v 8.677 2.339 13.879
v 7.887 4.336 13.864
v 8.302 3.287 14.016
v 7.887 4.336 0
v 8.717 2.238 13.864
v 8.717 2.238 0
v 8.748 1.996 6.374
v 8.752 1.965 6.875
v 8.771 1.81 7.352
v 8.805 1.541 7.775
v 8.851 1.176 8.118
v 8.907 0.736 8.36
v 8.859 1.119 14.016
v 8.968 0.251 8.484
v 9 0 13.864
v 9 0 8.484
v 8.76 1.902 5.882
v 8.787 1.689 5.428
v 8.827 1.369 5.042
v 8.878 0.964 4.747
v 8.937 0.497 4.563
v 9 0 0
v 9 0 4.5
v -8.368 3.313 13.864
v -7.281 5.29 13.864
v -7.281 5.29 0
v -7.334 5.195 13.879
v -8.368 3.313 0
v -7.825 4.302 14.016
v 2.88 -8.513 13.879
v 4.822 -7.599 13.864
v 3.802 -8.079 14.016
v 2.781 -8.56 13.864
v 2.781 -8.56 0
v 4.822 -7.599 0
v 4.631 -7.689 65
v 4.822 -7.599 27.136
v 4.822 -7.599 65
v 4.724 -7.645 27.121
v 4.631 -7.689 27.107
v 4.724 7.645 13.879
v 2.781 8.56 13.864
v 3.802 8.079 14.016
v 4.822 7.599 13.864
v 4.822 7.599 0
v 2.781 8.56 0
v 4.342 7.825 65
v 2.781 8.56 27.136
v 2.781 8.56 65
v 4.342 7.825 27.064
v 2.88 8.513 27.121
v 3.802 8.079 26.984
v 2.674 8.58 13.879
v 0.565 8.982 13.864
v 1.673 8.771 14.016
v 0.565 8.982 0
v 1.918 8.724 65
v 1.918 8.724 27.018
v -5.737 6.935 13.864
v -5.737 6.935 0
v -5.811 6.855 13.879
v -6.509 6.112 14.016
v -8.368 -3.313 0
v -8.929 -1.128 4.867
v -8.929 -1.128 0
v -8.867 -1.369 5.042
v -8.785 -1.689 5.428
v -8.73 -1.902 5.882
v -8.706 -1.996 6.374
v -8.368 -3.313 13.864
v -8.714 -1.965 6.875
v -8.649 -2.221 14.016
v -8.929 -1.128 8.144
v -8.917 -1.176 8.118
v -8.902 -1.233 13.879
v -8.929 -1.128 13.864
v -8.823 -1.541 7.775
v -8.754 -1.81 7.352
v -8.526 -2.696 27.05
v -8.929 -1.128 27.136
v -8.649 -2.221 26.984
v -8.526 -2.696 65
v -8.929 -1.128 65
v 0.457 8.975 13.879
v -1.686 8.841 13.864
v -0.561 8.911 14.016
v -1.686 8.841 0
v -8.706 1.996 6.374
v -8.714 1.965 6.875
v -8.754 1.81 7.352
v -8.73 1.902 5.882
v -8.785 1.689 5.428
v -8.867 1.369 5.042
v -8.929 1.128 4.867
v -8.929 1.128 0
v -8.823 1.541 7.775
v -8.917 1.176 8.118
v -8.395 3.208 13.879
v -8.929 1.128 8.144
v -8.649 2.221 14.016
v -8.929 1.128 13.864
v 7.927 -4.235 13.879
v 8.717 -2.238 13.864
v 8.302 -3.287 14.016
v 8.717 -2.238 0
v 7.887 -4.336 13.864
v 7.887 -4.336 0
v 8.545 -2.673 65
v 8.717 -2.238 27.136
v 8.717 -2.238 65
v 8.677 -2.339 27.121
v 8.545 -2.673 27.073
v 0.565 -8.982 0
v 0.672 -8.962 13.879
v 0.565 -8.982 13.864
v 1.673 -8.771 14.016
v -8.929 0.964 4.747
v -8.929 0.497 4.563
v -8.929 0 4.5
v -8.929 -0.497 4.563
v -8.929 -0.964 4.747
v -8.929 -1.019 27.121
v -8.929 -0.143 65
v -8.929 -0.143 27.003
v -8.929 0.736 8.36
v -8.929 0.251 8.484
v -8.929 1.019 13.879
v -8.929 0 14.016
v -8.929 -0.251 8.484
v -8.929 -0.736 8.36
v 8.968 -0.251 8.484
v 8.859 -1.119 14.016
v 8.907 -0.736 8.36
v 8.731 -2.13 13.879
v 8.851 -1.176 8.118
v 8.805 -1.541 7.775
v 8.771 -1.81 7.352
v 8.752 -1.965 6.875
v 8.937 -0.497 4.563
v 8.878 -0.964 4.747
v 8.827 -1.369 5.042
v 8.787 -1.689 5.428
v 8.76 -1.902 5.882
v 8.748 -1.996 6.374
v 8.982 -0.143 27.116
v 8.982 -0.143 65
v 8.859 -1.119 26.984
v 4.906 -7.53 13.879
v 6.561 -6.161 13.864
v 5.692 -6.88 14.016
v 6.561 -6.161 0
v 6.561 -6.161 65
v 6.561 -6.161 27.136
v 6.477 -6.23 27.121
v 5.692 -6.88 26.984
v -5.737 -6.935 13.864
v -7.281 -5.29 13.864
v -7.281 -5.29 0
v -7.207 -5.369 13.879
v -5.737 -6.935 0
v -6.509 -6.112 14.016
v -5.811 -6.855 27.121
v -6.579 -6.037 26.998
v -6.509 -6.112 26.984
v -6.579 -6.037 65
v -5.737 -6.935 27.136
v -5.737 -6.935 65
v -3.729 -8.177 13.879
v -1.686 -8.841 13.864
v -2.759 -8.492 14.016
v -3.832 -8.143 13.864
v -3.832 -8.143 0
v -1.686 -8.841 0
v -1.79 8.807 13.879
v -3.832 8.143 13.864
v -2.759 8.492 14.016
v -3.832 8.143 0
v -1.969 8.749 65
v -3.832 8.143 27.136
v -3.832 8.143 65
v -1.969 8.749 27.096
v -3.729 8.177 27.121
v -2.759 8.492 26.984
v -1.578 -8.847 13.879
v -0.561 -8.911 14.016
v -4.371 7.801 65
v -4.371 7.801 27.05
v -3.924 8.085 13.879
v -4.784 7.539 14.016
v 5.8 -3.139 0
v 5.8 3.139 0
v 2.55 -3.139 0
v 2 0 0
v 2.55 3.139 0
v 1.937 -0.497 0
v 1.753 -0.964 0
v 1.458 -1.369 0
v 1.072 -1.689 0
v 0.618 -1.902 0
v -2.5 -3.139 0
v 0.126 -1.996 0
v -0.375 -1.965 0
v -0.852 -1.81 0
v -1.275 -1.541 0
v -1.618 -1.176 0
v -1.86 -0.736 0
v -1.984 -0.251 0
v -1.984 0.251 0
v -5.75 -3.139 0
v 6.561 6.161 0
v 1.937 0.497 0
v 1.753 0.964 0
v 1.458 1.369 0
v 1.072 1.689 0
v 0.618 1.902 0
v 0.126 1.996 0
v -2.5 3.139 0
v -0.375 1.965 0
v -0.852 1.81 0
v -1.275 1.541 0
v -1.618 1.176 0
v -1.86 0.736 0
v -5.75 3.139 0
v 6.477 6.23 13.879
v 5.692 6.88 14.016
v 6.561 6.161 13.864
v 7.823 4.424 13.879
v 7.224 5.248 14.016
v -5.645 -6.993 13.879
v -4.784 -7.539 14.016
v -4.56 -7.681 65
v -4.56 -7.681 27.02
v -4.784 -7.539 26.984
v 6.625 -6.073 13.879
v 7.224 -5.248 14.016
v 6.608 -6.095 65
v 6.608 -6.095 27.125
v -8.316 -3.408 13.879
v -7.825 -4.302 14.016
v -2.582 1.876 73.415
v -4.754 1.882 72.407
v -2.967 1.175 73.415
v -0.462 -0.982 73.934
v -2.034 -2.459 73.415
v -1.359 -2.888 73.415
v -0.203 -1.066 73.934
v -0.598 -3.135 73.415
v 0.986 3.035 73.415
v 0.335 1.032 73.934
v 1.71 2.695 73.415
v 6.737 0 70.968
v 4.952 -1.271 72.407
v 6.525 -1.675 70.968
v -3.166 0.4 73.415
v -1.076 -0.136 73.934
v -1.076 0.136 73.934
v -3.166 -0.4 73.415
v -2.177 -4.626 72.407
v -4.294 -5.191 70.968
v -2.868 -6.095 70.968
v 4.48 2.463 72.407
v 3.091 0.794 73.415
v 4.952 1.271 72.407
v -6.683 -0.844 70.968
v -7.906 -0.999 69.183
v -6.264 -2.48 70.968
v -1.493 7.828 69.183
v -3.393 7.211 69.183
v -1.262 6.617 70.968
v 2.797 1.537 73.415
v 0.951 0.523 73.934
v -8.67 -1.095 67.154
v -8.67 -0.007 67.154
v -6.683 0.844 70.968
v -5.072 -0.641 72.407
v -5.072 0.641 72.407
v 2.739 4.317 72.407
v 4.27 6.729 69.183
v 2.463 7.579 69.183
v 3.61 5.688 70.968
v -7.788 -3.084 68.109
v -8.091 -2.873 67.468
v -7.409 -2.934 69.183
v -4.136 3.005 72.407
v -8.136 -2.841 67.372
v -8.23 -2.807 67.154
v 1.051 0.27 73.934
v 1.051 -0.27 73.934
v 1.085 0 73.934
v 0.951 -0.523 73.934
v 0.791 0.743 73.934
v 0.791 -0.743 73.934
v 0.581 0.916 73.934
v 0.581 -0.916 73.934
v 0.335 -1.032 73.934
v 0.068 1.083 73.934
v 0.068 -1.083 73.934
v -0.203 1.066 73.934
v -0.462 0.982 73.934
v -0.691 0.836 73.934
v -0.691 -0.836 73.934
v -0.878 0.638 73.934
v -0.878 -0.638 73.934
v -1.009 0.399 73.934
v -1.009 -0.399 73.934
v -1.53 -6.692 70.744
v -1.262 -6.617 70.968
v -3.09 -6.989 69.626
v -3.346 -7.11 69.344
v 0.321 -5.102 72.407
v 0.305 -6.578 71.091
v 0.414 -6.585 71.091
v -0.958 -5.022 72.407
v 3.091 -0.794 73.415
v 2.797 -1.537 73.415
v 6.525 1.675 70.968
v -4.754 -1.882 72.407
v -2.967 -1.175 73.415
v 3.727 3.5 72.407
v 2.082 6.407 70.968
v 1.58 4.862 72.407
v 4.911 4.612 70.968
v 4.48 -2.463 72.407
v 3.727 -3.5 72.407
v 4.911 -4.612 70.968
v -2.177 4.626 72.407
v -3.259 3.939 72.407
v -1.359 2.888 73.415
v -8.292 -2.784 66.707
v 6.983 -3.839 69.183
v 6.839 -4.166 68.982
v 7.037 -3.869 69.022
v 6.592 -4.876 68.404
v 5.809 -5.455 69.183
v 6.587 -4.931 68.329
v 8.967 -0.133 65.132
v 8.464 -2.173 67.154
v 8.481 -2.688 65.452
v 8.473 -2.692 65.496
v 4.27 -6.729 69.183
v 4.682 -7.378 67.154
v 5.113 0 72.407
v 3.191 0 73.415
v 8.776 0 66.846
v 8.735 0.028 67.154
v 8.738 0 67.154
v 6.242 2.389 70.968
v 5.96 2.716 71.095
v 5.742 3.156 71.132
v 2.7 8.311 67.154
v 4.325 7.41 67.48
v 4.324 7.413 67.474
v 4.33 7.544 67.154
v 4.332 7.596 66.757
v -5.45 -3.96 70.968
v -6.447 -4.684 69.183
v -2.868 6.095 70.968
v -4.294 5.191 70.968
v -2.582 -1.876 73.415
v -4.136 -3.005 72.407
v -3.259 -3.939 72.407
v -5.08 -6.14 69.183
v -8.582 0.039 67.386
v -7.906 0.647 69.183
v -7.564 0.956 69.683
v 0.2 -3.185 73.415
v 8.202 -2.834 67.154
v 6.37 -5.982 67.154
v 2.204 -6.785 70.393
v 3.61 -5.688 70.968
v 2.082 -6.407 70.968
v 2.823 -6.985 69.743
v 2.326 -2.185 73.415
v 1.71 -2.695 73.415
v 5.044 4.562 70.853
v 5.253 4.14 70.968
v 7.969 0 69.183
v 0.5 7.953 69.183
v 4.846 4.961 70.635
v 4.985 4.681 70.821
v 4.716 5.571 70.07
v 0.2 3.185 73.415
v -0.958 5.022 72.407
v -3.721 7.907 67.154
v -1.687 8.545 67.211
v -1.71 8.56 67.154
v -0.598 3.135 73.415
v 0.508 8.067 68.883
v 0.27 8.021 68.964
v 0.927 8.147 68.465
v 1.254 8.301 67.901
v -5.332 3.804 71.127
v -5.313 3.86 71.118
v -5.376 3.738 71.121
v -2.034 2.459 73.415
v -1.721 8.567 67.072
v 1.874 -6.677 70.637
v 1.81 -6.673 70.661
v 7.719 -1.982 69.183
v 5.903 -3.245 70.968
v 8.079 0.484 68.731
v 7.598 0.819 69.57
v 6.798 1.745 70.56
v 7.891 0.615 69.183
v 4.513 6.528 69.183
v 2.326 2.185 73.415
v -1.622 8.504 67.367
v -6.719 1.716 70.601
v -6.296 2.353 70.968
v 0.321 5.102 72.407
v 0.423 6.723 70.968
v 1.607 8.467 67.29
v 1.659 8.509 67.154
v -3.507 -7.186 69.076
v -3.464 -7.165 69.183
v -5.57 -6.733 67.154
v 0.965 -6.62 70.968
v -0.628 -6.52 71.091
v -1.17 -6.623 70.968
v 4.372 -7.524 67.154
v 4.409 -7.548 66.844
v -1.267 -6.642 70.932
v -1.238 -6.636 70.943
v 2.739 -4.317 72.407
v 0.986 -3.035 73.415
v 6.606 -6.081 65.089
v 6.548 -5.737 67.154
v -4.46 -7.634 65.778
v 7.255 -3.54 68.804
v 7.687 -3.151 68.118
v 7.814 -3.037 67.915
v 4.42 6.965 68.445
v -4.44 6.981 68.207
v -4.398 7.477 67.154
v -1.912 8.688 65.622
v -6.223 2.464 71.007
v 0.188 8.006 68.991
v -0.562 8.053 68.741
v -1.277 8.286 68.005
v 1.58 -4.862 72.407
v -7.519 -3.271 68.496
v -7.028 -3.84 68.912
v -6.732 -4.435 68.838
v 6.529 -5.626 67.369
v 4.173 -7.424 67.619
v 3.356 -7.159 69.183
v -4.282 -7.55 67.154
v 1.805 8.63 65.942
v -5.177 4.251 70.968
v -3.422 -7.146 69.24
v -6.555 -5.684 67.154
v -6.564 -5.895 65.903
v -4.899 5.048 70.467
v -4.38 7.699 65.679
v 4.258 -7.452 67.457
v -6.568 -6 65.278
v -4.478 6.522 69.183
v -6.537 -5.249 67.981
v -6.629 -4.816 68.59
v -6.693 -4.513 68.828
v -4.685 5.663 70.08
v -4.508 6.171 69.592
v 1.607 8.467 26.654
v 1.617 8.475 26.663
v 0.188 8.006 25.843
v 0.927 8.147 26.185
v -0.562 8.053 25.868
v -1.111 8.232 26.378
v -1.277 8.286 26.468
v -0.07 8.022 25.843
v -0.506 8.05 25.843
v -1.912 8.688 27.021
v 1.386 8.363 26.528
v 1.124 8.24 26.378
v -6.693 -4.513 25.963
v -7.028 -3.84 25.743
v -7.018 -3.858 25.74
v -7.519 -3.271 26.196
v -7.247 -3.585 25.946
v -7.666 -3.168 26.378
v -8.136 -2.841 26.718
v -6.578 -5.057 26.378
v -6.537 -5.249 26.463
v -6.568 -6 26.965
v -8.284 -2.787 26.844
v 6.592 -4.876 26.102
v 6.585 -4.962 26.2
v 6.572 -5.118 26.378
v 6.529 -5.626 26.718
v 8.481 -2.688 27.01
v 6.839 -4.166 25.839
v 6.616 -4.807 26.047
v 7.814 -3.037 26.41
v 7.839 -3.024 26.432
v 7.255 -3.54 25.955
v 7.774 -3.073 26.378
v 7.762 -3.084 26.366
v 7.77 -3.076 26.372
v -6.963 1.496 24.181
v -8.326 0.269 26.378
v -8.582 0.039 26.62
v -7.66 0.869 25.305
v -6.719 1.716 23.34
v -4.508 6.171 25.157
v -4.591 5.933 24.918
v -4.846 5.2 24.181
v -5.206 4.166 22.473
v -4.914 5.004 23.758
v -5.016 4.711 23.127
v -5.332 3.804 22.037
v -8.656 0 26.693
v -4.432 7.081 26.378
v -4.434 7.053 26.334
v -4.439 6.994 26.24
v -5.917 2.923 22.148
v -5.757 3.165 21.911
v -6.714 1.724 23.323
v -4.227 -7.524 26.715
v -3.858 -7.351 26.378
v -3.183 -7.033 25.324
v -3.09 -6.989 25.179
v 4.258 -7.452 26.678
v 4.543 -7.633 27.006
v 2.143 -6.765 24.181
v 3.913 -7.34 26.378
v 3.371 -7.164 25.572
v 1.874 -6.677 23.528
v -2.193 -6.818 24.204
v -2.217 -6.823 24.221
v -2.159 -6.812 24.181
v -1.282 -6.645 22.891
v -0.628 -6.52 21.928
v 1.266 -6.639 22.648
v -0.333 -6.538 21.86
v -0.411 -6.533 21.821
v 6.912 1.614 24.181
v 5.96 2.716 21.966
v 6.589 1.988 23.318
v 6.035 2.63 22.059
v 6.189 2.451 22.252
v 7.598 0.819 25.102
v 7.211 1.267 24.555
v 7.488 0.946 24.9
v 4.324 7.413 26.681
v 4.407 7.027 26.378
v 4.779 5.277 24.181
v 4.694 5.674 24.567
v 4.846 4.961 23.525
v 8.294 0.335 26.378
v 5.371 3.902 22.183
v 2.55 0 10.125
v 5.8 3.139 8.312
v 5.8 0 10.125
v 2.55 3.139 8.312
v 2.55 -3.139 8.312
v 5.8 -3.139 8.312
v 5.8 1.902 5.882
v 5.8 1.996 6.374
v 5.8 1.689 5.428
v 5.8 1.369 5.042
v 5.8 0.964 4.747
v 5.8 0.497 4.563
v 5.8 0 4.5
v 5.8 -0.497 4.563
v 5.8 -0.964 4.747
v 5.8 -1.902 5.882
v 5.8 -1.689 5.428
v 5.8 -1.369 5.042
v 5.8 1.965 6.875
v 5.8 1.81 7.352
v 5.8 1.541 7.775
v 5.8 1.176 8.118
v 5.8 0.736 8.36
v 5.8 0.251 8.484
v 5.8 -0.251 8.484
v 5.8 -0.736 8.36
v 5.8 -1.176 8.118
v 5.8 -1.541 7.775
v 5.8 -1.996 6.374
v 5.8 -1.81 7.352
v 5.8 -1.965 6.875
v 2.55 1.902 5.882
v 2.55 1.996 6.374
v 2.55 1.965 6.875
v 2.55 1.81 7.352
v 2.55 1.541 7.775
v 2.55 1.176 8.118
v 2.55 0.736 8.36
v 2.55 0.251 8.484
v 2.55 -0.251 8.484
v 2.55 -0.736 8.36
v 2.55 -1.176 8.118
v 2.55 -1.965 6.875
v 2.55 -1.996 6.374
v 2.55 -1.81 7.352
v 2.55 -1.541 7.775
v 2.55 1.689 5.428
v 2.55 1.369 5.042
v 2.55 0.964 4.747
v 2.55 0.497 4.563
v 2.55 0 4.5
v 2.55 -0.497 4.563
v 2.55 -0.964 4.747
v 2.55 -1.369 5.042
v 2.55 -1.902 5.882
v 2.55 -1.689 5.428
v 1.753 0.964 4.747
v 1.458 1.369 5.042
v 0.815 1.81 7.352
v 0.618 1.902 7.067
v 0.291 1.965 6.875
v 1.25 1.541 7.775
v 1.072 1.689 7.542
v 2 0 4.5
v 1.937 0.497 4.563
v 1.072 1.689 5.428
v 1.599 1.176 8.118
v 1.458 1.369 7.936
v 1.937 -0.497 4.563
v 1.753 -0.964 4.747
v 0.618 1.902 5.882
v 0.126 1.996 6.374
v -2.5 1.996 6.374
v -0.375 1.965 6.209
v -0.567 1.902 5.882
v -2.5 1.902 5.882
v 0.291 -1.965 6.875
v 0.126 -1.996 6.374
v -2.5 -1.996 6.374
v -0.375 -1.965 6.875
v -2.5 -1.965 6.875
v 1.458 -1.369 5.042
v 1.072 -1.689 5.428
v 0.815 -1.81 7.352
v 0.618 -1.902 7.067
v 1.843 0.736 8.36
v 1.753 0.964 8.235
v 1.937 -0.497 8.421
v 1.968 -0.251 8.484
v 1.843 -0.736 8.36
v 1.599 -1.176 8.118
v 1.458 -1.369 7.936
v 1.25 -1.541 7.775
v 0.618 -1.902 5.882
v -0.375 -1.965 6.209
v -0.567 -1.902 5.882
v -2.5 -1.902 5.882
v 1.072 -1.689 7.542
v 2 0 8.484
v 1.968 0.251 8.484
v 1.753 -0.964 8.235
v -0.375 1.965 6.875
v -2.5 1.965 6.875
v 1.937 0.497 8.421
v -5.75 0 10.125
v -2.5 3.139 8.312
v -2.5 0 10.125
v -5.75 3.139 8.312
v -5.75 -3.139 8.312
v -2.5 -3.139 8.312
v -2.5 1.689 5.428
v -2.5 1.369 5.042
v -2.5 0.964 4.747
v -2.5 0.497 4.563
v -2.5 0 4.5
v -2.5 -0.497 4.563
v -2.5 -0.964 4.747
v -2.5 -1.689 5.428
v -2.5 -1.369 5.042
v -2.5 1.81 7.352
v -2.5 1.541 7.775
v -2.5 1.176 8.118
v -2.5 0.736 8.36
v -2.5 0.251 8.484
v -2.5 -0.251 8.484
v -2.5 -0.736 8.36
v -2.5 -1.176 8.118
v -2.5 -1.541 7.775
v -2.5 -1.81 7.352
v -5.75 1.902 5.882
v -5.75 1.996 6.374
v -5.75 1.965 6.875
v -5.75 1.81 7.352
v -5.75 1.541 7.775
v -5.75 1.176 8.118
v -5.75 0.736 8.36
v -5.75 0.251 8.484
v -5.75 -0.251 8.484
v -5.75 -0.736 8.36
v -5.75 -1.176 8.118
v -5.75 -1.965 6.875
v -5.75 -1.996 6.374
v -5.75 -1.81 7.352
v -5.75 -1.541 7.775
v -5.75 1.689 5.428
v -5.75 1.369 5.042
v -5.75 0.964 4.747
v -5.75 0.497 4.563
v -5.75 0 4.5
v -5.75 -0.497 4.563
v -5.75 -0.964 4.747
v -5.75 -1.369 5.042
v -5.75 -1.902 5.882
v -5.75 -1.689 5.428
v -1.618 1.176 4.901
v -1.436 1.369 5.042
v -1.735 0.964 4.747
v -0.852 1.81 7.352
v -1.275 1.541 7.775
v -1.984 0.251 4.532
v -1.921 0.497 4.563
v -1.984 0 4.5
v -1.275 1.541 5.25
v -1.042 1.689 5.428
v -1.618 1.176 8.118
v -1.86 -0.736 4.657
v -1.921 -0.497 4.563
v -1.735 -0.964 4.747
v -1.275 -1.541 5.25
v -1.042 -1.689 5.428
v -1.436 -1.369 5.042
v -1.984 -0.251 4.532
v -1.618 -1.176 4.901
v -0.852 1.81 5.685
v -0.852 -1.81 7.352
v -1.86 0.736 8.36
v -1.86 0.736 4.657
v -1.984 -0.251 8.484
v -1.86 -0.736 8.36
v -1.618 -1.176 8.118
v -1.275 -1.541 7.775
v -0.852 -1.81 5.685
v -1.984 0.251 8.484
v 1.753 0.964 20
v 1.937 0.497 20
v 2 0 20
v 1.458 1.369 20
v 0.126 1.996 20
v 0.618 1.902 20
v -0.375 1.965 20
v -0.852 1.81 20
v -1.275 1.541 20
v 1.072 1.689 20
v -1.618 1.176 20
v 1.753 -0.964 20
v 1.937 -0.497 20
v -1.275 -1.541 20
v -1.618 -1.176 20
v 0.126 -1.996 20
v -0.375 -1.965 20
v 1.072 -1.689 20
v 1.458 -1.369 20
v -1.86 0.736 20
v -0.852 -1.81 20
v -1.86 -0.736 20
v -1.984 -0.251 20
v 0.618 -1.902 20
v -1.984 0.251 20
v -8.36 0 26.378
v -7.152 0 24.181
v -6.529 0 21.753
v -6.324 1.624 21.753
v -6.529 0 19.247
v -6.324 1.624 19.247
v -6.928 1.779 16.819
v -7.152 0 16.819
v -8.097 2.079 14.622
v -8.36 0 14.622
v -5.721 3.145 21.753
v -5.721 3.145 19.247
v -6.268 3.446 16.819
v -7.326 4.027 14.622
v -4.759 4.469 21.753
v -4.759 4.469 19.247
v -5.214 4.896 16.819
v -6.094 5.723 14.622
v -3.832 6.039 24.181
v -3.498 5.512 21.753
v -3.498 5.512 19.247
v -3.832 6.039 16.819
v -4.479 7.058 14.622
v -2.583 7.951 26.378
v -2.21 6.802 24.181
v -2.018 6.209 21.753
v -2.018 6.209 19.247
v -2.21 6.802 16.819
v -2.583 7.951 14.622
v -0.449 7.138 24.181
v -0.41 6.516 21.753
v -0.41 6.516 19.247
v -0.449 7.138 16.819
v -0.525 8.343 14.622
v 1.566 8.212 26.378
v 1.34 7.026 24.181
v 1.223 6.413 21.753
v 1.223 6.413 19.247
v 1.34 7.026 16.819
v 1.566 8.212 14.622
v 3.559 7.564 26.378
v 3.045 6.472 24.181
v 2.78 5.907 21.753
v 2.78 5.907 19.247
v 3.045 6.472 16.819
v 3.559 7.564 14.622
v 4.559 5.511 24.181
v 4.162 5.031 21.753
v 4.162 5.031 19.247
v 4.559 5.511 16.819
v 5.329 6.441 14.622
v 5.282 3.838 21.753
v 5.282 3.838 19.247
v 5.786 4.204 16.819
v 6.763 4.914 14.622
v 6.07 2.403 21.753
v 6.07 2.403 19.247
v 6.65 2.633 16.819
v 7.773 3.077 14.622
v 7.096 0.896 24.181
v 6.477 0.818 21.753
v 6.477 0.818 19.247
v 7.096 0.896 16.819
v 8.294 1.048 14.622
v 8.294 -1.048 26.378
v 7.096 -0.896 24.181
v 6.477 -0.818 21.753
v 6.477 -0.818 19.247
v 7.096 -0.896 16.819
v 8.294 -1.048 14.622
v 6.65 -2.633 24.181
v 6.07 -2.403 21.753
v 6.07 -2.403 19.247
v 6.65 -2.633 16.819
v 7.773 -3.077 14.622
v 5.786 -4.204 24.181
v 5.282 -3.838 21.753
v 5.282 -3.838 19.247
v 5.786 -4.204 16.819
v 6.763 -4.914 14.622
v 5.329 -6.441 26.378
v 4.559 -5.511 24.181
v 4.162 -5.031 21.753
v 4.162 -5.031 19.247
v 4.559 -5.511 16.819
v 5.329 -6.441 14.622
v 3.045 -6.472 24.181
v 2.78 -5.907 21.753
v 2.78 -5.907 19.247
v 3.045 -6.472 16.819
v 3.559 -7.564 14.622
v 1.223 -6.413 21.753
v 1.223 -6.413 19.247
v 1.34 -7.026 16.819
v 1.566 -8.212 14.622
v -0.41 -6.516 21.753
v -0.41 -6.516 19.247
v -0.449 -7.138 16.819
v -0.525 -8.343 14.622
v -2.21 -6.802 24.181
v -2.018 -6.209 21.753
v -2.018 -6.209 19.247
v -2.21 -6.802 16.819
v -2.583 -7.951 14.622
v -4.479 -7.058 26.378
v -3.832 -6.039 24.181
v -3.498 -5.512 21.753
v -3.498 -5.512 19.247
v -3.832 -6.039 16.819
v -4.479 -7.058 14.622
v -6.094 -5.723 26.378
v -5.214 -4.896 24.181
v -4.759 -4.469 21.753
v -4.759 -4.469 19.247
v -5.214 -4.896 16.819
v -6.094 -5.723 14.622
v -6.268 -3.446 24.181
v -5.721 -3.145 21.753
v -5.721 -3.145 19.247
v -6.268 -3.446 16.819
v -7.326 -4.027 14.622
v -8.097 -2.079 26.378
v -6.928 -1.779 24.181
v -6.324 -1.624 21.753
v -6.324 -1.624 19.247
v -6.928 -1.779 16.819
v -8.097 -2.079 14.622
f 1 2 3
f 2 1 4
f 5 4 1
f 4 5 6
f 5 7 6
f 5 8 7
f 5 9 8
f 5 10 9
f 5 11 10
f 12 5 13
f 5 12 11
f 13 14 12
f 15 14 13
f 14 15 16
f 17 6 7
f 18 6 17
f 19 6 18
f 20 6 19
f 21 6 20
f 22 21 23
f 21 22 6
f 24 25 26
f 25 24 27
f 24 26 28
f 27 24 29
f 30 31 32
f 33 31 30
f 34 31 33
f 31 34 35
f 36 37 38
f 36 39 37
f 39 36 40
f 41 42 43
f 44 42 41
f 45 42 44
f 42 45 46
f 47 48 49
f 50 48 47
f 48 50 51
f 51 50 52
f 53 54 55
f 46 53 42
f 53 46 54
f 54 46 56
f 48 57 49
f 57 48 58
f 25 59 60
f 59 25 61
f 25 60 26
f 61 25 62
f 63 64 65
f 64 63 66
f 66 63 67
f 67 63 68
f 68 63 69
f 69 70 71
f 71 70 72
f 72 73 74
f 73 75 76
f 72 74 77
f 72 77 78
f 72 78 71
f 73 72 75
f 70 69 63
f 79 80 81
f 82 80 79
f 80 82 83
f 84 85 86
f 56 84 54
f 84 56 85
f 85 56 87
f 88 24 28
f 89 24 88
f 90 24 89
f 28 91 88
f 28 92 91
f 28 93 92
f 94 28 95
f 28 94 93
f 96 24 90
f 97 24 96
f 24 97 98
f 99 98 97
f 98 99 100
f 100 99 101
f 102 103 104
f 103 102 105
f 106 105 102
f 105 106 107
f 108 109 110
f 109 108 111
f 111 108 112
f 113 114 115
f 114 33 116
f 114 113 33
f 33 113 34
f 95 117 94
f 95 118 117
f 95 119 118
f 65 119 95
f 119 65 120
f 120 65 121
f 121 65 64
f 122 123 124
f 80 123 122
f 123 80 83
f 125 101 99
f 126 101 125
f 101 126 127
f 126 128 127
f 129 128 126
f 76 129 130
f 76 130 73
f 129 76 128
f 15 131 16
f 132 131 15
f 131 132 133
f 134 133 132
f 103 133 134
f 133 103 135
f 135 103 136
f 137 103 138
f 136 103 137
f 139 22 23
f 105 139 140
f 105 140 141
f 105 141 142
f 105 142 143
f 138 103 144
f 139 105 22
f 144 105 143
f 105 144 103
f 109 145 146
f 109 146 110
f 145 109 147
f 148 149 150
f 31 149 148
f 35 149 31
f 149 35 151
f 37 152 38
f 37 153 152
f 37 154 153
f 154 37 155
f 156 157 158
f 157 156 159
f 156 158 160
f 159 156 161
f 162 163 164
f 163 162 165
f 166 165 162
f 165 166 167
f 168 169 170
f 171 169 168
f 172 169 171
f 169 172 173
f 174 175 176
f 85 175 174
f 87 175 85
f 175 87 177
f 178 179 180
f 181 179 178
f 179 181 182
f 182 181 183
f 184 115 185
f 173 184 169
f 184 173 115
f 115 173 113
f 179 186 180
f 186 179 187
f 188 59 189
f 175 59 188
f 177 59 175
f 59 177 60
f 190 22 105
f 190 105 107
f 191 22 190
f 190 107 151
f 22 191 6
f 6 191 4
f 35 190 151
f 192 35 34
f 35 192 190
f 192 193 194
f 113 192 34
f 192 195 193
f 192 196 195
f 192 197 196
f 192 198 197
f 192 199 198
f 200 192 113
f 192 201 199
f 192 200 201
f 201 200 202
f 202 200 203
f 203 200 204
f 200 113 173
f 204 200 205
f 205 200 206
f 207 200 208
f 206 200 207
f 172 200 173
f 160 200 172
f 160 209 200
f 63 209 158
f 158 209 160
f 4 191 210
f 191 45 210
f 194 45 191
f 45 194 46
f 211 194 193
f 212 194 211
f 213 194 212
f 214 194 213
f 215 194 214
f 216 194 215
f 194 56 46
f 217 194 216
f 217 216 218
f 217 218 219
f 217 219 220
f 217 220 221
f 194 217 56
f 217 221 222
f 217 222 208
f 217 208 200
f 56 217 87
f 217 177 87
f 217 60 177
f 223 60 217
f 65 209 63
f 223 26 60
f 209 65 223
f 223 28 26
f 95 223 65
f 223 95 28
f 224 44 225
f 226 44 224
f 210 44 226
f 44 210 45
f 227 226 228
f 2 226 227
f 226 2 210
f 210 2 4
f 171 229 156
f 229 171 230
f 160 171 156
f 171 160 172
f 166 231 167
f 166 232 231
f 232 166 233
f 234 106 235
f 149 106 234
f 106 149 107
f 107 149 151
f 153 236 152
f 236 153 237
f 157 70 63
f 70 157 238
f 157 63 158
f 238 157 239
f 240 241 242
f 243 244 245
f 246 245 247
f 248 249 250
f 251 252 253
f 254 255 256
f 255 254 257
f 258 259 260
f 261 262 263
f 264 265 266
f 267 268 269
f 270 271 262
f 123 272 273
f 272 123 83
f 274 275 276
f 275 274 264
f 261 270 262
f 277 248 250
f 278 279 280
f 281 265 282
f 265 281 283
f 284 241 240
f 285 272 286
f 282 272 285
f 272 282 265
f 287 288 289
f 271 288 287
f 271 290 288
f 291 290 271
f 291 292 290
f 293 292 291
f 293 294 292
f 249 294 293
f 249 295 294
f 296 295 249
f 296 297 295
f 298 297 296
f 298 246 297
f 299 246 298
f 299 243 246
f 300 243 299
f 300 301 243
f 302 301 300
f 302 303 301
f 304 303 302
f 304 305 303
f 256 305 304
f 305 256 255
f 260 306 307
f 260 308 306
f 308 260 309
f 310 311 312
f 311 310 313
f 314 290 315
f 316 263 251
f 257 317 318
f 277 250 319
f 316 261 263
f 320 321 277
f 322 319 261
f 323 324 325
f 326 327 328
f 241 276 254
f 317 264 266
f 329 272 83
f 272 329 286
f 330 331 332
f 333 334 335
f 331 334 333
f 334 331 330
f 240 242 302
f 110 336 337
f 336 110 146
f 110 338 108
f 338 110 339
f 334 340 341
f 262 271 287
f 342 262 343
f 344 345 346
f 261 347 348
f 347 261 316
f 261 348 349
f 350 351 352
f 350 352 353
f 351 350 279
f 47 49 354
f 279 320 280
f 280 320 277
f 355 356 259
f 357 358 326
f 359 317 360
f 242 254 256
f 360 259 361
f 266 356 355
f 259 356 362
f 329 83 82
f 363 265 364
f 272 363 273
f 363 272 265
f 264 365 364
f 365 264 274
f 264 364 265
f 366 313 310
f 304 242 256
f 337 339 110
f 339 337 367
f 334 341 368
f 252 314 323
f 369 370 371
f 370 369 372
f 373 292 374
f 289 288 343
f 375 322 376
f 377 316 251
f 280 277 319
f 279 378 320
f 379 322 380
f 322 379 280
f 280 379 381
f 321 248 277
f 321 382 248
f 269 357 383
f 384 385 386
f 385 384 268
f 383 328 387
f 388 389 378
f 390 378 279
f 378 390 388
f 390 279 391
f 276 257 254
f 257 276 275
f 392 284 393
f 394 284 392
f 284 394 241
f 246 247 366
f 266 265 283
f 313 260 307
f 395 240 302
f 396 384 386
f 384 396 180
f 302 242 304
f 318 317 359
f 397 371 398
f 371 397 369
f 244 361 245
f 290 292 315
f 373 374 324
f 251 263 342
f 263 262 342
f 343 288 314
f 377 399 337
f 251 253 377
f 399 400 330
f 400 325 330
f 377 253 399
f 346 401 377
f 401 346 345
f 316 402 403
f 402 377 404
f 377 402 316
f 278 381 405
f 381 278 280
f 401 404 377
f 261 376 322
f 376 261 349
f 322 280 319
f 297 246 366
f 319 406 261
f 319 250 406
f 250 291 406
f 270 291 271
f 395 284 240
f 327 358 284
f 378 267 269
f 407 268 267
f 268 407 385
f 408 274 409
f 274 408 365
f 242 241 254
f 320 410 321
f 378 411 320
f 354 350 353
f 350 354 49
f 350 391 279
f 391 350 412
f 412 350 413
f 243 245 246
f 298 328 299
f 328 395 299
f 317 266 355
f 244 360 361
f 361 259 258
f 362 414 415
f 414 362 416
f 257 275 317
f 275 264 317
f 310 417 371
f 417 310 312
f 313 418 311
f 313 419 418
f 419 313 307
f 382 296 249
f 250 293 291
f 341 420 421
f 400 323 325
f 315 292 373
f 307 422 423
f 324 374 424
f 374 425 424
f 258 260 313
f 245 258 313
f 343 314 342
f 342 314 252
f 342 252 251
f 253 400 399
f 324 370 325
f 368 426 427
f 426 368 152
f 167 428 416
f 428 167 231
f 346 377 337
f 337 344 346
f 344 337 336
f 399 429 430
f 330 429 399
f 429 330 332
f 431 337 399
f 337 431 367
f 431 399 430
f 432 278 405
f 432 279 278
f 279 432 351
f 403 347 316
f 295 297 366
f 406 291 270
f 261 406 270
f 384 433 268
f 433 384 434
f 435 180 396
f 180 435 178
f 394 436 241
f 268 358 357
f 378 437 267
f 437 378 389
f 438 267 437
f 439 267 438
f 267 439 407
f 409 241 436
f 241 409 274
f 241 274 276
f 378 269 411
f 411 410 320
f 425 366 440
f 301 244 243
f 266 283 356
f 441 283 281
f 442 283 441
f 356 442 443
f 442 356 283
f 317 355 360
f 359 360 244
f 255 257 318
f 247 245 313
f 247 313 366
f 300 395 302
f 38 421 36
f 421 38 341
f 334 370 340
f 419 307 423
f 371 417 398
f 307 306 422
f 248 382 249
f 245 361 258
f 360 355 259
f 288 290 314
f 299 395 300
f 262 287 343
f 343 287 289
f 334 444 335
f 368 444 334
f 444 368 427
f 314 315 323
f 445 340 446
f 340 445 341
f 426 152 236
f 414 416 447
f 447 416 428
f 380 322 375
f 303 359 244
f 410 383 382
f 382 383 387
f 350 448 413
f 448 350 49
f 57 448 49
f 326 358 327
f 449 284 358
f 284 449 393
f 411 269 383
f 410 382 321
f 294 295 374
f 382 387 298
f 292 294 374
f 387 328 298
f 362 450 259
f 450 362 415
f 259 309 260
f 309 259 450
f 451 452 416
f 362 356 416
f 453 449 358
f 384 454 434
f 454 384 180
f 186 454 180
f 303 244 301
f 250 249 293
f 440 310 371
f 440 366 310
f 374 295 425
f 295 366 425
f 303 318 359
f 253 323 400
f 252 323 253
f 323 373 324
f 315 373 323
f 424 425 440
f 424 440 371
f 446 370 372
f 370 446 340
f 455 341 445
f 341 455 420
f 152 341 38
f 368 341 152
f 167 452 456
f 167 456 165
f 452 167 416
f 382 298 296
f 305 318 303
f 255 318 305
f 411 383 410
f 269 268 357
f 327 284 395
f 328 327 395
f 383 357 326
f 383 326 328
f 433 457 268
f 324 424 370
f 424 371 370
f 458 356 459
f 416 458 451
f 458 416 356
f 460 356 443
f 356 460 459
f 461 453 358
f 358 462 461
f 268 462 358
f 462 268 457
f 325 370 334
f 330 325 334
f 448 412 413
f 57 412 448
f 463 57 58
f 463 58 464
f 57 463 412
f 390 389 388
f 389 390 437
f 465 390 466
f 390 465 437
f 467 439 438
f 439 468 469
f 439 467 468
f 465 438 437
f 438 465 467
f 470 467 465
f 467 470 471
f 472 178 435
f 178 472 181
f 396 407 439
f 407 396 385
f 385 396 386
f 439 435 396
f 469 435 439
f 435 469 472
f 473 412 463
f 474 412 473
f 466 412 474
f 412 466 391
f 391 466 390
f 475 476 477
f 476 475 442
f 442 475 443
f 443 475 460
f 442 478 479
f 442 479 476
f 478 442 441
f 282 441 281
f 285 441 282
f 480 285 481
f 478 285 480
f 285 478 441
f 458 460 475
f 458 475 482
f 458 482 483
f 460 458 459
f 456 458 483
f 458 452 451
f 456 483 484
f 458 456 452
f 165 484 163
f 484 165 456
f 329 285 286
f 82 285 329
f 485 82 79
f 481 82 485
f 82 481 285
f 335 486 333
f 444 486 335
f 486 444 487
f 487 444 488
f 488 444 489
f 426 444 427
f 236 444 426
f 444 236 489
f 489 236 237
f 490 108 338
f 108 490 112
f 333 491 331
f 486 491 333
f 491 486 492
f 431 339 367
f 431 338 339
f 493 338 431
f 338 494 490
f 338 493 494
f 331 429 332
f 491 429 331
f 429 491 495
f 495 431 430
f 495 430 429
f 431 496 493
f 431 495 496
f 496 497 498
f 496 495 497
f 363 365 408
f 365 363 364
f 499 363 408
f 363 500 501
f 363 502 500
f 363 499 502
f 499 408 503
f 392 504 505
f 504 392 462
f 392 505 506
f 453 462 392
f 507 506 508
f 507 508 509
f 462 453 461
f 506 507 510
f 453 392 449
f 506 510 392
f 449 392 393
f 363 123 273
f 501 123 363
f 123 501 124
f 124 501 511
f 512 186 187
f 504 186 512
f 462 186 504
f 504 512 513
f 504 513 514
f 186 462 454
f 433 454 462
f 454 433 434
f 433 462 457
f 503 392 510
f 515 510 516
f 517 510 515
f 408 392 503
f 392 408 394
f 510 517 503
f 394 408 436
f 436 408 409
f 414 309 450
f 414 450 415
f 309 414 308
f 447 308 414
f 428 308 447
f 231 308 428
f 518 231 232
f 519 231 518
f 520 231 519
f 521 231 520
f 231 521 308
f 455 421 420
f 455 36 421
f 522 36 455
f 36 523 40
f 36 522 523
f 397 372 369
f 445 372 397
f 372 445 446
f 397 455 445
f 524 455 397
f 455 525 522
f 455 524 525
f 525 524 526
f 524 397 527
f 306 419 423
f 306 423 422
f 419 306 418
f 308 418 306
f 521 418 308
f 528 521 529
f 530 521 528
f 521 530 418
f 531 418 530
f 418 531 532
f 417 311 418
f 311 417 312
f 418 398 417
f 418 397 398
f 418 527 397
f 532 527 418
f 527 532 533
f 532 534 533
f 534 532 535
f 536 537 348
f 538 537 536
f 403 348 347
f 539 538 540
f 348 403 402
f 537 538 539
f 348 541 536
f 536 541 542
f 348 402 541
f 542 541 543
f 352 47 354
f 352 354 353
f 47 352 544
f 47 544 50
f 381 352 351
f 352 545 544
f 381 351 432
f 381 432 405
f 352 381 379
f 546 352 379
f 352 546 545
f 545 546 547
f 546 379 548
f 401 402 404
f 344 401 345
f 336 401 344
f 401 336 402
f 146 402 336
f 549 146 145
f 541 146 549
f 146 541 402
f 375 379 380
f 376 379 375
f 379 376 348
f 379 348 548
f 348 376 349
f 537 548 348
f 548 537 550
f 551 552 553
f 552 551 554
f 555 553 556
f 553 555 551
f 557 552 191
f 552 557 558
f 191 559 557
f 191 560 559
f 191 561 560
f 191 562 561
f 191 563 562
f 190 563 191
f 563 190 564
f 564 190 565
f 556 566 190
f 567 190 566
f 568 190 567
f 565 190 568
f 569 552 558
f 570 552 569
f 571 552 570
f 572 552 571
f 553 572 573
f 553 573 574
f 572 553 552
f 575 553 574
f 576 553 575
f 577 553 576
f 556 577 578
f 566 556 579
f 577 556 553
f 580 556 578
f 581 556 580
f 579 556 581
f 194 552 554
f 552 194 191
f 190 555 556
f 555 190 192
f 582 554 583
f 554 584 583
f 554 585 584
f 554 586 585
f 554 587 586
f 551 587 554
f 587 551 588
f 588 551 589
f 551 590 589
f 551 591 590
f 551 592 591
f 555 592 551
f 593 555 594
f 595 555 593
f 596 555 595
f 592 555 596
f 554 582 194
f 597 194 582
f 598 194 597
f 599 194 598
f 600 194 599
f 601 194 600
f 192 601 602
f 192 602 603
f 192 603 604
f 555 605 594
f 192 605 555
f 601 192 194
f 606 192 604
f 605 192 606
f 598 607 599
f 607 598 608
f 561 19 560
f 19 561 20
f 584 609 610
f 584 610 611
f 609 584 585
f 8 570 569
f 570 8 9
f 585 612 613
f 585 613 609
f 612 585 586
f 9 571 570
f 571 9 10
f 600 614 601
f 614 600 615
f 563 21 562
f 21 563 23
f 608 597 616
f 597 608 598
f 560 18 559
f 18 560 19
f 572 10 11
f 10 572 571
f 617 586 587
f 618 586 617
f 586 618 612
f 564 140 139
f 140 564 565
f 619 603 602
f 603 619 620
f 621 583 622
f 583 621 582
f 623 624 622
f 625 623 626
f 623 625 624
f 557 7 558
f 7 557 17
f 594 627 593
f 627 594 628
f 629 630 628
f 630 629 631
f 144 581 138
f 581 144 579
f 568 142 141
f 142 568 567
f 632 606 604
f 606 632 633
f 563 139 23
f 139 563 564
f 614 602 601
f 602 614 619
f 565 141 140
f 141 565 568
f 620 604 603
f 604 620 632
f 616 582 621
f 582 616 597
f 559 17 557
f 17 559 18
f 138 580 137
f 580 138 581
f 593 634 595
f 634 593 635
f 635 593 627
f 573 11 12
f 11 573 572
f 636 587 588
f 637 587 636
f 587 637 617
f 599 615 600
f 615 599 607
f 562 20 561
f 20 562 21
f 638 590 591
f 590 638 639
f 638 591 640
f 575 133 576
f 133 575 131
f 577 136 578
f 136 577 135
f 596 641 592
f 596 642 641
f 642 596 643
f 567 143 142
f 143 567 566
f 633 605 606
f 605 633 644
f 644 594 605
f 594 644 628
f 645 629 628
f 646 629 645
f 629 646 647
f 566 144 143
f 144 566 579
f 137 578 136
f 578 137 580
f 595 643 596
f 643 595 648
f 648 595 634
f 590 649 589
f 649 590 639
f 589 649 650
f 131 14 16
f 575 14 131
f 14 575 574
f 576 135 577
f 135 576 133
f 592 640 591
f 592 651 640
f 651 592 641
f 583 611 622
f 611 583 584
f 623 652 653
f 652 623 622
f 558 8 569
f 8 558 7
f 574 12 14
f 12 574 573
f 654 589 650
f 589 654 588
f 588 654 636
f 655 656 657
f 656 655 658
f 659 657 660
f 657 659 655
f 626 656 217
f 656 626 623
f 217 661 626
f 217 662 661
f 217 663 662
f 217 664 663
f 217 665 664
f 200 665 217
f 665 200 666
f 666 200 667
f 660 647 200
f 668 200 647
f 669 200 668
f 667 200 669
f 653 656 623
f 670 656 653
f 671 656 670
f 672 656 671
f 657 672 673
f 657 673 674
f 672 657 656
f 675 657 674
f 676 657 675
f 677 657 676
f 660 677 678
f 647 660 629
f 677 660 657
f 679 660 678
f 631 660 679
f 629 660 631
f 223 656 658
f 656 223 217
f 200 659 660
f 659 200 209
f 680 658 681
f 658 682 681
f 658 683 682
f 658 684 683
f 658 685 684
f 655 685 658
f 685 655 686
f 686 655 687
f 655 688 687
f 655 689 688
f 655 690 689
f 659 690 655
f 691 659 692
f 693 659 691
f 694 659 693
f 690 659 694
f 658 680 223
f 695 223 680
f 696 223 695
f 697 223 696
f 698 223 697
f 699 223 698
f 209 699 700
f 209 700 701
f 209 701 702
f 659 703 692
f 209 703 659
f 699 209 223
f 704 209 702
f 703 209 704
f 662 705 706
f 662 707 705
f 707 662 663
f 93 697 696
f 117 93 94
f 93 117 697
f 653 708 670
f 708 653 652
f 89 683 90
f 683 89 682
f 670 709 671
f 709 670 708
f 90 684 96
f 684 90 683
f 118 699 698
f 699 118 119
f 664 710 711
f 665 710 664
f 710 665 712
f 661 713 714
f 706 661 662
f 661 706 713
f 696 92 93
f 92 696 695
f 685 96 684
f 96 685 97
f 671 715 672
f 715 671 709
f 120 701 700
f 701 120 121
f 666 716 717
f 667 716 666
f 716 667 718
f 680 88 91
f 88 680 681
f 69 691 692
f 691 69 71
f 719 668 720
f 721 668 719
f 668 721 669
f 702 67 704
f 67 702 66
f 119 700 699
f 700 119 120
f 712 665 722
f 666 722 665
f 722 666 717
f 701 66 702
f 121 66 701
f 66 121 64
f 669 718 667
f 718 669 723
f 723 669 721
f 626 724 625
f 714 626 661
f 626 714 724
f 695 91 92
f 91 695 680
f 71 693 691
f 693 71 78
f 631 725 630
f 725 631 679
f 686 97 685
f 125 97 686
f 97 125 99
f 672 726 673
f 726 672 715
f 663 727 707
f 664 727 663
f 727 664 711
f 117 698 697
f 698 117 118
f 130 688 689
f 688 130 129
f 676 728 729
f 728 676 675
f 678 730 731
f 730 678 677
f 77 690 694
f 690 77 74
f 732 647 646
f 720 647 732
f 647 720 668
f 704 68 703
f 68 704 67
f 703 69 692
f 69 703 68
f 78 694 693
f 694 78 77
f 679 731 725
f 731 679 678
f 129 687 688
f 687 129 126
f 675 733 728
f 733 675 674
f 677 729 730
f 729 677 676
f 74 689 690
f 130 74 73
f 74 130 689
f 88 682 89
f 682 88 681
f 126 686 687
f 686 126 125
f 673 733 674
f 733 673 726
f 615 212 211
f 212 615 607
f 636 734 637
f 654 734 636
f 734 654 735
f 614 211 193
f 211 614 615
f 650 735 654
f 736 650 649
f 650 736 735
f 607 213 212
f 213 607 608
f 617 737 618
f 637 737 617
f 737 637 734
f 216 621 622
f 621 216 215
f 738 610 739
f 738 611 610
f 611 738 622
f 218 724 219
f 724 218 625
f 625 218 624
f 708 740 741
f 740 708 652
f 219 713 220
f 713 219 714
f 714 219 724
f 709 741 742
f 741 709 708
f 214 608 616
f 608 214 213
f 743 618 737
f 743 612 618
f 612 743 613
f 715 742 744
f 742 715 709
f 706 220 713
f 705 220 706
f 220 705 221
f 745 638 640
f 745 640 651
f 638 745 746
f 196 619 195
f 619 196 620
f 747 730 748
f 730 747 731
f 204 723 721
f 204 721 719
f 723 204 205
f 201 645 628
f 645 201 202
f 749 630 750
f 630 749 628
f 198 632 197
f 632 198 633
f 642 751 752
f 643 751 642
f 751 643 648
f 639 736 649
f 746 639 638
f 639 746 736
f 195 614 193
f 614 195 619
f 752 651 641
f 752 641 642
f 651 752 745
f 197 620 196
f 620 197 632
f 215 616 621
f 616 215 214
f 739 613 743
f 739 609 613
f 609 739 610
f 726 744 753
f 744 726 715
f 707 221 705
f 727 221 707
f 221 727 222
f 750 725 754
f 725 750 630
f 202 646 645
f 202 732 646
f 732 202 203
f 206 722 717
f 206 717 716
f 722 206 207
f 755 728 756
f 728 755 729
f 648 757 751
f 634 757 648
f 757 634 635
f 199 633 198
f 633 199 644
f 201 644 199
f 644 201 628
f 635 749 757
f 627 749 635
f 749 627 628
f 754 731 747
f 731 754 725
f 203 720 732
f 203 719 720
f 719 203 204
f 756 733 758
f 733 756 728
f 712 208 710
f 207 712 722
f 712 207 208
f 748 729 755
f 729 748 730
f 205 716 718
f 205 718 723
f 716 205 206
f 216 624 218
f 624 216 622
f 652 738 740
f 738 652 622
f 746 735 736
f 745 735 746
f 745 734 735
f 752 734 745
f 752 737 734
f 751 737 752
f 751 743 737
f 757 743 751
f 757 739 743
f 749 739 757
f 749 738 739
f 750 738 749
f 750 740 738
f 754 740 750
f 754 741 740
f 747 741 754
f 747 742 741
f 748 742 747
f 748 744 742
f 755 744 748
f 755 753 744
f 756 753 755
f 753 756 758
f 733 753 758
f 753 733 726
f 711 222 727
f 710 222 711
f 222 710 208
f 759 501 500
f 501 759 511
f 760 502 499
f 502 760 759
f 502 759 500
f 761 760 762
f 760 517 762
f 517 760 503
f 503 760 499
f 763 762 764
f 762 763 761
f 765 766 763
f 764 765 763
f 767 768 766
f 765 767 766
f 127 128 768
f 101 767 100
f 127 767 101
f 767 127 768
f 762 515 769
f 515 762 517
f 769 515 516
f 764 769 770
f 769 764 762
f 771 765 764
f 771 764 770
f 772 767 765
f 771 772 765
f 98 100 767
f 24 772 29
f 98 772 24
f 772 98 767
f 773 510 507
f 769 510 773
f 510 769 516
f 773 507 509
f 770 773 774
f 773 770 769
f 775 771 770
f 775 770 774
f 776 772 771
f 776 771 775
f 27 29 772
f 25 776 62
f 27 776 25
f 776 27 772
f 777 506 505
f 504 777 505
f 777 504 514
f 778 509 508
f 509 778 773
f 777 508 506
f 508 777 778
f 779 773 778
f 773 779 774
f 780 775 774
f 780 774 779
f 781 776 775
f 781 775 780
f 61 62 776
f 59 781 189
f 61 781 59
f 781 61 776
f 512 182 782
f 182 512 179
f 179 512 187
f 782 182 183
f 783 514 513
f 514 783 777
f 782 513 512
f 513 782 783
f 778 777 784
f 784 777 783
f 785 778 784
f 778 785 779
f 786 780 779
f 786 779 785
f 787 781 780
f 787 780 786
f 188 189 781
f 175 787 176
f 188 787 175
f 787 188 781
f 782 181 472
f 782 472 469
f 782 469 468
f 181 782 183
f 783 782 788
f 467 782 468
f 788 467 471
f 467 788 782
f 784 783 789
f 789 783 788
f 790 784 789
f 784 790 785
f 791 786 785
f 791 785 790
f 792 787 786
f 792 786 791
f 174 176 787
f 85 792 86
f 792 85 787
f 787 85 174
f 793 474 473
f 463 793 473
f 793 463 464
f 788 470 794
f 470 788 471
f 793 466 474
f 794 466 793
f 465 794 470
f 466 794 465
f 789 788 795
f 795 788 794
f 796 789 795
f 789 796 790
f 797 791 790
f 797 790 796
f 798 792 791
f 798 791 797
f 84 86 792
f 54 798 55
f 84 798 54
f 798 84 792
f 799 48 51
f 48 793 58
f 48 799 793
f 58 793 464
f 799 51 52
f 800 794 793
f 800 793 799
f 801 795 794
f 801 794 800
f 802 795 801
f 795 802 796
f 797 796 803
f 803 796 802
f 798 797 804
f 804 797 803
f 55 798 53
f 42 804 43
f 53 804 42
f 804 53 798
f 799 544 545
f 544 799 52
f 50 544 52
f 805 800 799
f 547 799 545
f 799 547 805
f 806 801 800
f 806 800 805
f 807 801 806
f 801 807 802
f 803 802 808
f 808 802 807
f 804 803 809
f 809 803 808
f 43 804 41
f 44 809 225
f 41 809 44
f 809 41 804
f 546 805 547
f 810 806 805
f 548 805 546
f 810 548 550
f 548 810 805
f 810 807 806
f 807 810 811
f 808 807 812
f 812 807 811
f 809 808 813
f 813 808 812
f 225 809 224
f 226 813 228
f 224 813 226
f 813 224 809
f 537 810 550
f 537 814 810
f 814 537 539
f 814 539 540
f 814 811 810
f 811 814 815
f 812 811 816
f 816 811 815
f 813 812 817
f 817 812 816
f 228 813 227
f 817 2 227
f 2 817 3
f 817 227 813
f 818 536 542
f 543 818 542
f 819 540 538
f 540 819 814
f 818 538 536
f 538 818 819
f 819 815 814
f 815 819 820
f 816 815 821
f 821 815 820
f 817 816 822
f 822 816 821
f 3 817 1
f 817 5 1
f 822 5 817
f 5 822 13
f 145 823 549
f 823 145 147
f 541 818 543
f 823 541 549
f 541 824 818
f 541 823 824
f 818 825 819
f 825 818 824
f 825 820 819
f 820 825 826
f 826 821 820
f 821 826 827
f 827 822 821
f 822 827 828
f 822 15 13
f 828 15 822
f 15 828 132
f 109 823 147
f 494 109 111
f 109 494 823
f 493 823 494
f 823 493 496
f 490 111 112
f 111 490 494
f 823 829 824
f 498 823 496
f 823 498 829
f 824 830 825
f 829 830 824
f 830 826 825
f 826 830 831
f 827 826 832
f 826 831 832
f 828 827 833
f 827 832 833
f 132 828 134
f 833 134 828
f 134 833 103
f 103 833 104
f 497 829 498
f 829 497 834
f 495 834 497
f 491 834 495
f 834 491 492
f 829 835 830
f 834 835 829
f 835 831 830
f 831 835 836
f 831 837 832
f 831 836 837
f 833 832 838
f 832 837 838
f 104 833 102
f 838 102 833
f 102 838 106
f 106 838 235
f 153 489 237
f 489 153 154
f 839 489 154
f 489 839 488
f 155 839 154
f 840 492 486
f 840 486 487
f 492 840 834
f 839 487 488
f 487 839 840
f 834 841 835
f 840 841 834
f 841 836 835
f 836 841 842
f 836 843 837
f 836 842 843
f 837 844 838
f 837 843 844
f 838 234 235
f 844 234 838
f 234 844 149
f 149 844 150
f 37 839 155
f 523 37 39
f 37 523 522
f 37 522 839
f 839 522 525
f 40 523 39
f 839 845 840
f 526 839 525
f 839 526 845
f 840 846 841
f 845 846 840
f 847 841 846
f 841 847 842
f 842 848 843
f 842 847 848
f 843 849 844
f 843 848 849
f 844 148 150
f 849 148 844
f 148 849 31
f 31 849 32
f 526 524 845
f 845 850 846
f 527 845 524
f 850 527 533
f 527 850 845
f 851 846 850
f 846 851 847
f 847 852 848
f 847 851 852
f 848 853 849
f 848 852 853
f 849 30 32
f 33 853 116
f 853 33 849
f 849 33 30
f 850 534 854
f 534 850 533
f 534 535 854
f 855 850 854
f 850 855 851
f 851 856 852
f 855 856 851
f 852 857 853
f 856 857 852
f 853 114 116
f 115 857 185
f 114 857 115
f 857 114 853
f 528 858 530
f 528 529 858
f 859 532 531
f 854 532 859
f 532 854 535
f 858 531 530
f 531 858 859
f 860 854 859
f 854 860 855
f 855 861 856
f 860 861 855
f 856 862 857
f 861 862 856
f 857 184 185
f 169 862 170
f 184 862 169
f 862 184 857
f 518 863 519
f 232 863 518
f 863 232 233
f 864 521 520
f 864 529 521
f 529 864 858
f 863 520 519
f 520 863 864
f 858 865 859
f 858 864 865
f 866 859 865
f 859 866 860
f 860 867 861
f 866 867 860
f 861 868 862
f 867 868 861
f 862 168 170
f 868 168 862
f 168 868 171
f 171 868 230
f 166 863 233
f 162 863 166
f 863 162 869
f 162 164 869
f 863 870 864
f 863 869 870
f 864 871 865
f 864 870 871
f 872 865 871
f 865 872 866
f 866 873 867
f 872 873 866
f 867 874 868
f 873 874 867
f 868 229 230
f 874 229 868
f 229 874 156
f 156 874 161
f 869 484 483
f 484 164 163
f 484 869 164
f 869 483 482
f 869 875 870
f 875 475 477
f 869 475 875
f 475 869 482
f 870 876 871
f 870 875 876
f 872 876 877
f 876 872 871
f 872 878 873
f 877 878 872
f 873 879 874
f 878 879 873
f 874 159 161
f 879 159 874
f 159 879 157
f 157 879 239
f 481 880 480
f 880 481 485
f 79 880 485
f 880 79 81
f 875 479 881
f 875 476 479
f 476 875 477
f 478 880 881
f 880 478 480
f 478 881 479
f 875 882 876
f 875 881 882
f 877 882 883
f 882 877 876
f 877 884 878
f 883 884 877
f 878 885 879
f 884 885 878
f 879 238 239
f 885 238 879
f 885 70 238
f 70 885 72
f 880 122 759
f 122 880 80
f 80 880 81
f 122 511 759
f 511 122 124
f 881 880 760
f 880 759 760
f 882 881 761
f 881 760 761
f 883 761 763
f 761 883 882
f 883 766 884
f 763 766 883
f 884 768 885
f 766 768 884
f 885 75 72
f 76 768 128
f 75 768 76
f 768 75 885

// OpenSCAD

//Variables

// preview[view:north east, tilt:side]

//The units of your Drill Bit.
Drill_Bit_Diameter_Units=1; //[1: Millimeter, 2:Inches]

//Diameter of the Drill bit.  Only accepts Decimals. No Fractions
Drill_Bit_Diameter=3; 

//Drill Bit Length: How Far do you want the Drill Bit to go into the Handle
Drill_Bit_Length=20;

//Length of the Handle
Handle_Length=65; 

//Diameter of the Handle
Handle_Diameter=15; 


//Diameter of the set Screw
Set_Screw_Diameter=3; 

//Thickness of the set Screw Nut
Set_Screw_Nut_Thickness=3; 

//Diameter of the Set Screw Nut
Set_Screw_Nut_Diameter=5.5; 

//Number of Nut Traps
Number_of_Nut_Traps=2;

//The Overall Resolution of the Handle
Resolution=25; 

//Ignore these variables


db_d=Drill_Bit_Diameter;
hl=Handle_Length;
hd=Handle_Diameter;
db_l=Drill_Bit_Length;
db_d=Drill_Bit_Diameter;
ss_d=Set_Screw_Diameter;
ss_n_t=Set_Screw_Nut_Thickness;
ss_n_d=Set_Screw_Nut_Diameter;
$fn=Resolution;




if(Drill_Bit_Diameter_Units==1){
Drill_Bit_Handle_Metric();
}
if(Drill_Bit_Diameter_Units==2){
Drill_Bit_Handle();
}




module Drill_Bit_Handle_Metric(){

	difference(){
	
		//Main Body of the Drill Bit Handle
		union(){

			cylinder(hl,(hd+db_d)/2,(hd+db_d)/2); 
			translate([0,0,hl])
				sphere((hd+db_d)/2);

		}

		//Hole for Drill Bit
		cylinder(db_l,(db_d+1)/2,(db_d+1)/2); 
	
		
		//This is the Groove on the bottom of the handle	
		translate([0,0,(ss_n_d)+15])
			rotate_extrude(convexity = 10)
				translate([((hd+db_d)/2)+7.45, 0, 0])
					circle(r = 10);
	
		// Small Grooves for the Handle
		for ( i = [0 : 3] ){	
		    rotate( i * 360 / 3, [0, 0, 1])
		  	  translate([0, ((hd+db_d)/2)+2, (ss_n_d/2)+17])
		  		 cylinder(hl-((ss_n_d/2)),3,3);
		}
			
			//Large Grooves for the handle
			
			
				rotate([0,0,360/6]){
					for ( i = [0 : 3] ){	
					    rotate( i * 360 / 3, [0, 0, 1])
					  	  translate([0,  ((hd+db_d)+(13)+2)/2, (ss_n_d/2)+17])
					  		cylinder(hl-((ss_n_d/2)),(20)/2,(20)/2);
					}
				}
			
		
		
			//Nut Trap
		
		if (Number_of_Nut_Traps==2){
		
			translate([db_d/2+(ss_n_t-.45),0,ss_n_d+1]){
			
			union(){
				hull(){
		
					rotate([0,90,0])
						translate([0,0,ss_n_t/-2])
							hexagon(ss_n_t+.25,(ss_n_d+1.75)/2);
		
					rotate([0,90,0])
						translate([(ss_n_d/2)+10,0,ss_n_t/-2])
							hexagon(ss_n_t+.25,(ss_n_d+1.75)/2);
		
				}
	
			rotate([0,90,0])
				translate([0,0,(hd+db_d)/-7+ss_n_t/-2])
					cylinder((hd+db_d+1)/2,(ss_d+1)/2,(ss_d+1)/2);
		
			}
			}
			
			}
			//Nut Trap
			translate([db_d/-2-(ss_n_t-.25),0,ss_n_d+1]){
		
				hull(){
		
					rotate([0,90,0])
						translate([0,0,ss_n_t/-2])
							hexagon(ss_n_t+.25,(ss_n_d+1.75)/2);
		
					rotate([0,90,0])
						translate([(ss_n_d/2)+10,0,ss_n_t/-2])
							hexagon(ss_n_t+.25,(ss_n_d+1.75)/2);
		
				}
	
			rotate([0,90,0])
				translate([0,0,(hd+db_d)/-5.1+ss_n_t/-2])
					cylinder((hd+db_d+1)/2,(ss_d+1)/2,(ss_d+1)/2);
		
			}
	
	}
	

	}

module Drill_Bit_Handle(){

difference(){

	//Main Body of the Drill Bit Handle
	union(){
	
		cylinder(hl,(hd+(db_d*25.4))/2,(hd+(db_d*25.4))/2); 
	
		translate([0,0,hl])	
			sphere((hd+(db_d*25.4))/2);
	
	}
	
	//Hole for Drill Bit
	cylinder(db_l,((db_d*25.4)+1)/2,((db_d*25.4)+1)/2); 

	//This is the Groove on the bottom of the handle 

	translate([0,0,(ss_n_d)+15])
		rotate_extrude(convexity = 10)
			translate([((hd+(db_d*25.4))/2)+7.45, 0, 0])
				circle(r = 10);

	// Small Grooves for the Handle
	for ( i = [0 : 3] ){ 

		rotate( i * 360 / 3, [0, 0, 1])

		translate([0, ((hd+(db_d*25.4))/2)+2, (ss_n_d/2)+17])
			cylinder(hl-((ss_n_d/2)),3,3);

	}
	//Large Grooves for the handle
	rotate([0,0,360/6]){

		for ( i = [0 : 3] ){ 

		rotate( i * 360 / 3, [0, 0, 1])

		translate([0, ((hd+(db_d*25.4))+(13)+2)/2, (ss_n_d/2)+17])
			cylinder(hl-((ss_n_d/2)),(20)/2,(20)/2);

		}

	}

	//Nut Trap
	if (Number_of_Nut_Traps==2){

		translate([(db_d*25.4)/2+(ss_n_t-.45),0,ss_n_d+1]){

			union(){

				hull(){

					rotate([0,90,0])
						translate([0,0,ss_n_t/-2])
							hexagon(ss_n_t+.25,(ss_n_d+1.75)/2);

	rotate([0,90,0])
		translate([(ss_n_d/2)+10,0,ss_n_t/-2])
			hexagon(ss_n_t+.25,(ss_n_d+1.75)/2);

	}

	rotate([0,90,0])
		translate([0,0,(hd+(db_d*25.4))/-7+ss_n_t/-2])
			cylinder((hd+(db_d*25.4)+1)/2,(ss_d+1)/2,(ss_d+1)/2);

	}

	}

	}

	//Nut Trap

	translate([(db_d*25.4)/-2-(ss_n_t-.25),0,ss_n_d+1]){

		hull(){
	
		rotate([0,90,0])
			translate([0,0,ss_n_t/-2])
				hexagon(ss_n_t+.25,(ss_n_d+1.75)/2);
	
		rotate([0,90,0])
			translate([(ss_n_d/2)+10,0,ss_n_t/-2])
				hexagon(ss_n_t+.25,(ss_n_d+1.75)/2);
	
		}

	rotate([0,90,0])
		translate([0,0,(hd+(db_d*25.4))/-5.1+ss_n_t/-2])
			cylinder((hd+(db_d*25.4)+1)/2,(ss_d+1)/2,(ss_d+1)/2);

	}

	}

}



			
			



module reg_polygon(sides,radius)
{
  function dia(r) = sqrt(pow(r*2,2)/2);  //sqrt((r*2^2)/2) if only we had an exponention op
  if(sides<2) square([radius,0]);
  if(sides==3) triangle(radius);
  if(sides==4) square([dia(radius),dia(radius)],center=true);
  if(sides>4) circle(r=radius,$fn=sides);
}

module hexagonf(radius)
{
  reg_polygon(6,radius);
}

module hexagon(height,radius) 
{
  linear_extrude(height=height) hexagonf(radius);
}
